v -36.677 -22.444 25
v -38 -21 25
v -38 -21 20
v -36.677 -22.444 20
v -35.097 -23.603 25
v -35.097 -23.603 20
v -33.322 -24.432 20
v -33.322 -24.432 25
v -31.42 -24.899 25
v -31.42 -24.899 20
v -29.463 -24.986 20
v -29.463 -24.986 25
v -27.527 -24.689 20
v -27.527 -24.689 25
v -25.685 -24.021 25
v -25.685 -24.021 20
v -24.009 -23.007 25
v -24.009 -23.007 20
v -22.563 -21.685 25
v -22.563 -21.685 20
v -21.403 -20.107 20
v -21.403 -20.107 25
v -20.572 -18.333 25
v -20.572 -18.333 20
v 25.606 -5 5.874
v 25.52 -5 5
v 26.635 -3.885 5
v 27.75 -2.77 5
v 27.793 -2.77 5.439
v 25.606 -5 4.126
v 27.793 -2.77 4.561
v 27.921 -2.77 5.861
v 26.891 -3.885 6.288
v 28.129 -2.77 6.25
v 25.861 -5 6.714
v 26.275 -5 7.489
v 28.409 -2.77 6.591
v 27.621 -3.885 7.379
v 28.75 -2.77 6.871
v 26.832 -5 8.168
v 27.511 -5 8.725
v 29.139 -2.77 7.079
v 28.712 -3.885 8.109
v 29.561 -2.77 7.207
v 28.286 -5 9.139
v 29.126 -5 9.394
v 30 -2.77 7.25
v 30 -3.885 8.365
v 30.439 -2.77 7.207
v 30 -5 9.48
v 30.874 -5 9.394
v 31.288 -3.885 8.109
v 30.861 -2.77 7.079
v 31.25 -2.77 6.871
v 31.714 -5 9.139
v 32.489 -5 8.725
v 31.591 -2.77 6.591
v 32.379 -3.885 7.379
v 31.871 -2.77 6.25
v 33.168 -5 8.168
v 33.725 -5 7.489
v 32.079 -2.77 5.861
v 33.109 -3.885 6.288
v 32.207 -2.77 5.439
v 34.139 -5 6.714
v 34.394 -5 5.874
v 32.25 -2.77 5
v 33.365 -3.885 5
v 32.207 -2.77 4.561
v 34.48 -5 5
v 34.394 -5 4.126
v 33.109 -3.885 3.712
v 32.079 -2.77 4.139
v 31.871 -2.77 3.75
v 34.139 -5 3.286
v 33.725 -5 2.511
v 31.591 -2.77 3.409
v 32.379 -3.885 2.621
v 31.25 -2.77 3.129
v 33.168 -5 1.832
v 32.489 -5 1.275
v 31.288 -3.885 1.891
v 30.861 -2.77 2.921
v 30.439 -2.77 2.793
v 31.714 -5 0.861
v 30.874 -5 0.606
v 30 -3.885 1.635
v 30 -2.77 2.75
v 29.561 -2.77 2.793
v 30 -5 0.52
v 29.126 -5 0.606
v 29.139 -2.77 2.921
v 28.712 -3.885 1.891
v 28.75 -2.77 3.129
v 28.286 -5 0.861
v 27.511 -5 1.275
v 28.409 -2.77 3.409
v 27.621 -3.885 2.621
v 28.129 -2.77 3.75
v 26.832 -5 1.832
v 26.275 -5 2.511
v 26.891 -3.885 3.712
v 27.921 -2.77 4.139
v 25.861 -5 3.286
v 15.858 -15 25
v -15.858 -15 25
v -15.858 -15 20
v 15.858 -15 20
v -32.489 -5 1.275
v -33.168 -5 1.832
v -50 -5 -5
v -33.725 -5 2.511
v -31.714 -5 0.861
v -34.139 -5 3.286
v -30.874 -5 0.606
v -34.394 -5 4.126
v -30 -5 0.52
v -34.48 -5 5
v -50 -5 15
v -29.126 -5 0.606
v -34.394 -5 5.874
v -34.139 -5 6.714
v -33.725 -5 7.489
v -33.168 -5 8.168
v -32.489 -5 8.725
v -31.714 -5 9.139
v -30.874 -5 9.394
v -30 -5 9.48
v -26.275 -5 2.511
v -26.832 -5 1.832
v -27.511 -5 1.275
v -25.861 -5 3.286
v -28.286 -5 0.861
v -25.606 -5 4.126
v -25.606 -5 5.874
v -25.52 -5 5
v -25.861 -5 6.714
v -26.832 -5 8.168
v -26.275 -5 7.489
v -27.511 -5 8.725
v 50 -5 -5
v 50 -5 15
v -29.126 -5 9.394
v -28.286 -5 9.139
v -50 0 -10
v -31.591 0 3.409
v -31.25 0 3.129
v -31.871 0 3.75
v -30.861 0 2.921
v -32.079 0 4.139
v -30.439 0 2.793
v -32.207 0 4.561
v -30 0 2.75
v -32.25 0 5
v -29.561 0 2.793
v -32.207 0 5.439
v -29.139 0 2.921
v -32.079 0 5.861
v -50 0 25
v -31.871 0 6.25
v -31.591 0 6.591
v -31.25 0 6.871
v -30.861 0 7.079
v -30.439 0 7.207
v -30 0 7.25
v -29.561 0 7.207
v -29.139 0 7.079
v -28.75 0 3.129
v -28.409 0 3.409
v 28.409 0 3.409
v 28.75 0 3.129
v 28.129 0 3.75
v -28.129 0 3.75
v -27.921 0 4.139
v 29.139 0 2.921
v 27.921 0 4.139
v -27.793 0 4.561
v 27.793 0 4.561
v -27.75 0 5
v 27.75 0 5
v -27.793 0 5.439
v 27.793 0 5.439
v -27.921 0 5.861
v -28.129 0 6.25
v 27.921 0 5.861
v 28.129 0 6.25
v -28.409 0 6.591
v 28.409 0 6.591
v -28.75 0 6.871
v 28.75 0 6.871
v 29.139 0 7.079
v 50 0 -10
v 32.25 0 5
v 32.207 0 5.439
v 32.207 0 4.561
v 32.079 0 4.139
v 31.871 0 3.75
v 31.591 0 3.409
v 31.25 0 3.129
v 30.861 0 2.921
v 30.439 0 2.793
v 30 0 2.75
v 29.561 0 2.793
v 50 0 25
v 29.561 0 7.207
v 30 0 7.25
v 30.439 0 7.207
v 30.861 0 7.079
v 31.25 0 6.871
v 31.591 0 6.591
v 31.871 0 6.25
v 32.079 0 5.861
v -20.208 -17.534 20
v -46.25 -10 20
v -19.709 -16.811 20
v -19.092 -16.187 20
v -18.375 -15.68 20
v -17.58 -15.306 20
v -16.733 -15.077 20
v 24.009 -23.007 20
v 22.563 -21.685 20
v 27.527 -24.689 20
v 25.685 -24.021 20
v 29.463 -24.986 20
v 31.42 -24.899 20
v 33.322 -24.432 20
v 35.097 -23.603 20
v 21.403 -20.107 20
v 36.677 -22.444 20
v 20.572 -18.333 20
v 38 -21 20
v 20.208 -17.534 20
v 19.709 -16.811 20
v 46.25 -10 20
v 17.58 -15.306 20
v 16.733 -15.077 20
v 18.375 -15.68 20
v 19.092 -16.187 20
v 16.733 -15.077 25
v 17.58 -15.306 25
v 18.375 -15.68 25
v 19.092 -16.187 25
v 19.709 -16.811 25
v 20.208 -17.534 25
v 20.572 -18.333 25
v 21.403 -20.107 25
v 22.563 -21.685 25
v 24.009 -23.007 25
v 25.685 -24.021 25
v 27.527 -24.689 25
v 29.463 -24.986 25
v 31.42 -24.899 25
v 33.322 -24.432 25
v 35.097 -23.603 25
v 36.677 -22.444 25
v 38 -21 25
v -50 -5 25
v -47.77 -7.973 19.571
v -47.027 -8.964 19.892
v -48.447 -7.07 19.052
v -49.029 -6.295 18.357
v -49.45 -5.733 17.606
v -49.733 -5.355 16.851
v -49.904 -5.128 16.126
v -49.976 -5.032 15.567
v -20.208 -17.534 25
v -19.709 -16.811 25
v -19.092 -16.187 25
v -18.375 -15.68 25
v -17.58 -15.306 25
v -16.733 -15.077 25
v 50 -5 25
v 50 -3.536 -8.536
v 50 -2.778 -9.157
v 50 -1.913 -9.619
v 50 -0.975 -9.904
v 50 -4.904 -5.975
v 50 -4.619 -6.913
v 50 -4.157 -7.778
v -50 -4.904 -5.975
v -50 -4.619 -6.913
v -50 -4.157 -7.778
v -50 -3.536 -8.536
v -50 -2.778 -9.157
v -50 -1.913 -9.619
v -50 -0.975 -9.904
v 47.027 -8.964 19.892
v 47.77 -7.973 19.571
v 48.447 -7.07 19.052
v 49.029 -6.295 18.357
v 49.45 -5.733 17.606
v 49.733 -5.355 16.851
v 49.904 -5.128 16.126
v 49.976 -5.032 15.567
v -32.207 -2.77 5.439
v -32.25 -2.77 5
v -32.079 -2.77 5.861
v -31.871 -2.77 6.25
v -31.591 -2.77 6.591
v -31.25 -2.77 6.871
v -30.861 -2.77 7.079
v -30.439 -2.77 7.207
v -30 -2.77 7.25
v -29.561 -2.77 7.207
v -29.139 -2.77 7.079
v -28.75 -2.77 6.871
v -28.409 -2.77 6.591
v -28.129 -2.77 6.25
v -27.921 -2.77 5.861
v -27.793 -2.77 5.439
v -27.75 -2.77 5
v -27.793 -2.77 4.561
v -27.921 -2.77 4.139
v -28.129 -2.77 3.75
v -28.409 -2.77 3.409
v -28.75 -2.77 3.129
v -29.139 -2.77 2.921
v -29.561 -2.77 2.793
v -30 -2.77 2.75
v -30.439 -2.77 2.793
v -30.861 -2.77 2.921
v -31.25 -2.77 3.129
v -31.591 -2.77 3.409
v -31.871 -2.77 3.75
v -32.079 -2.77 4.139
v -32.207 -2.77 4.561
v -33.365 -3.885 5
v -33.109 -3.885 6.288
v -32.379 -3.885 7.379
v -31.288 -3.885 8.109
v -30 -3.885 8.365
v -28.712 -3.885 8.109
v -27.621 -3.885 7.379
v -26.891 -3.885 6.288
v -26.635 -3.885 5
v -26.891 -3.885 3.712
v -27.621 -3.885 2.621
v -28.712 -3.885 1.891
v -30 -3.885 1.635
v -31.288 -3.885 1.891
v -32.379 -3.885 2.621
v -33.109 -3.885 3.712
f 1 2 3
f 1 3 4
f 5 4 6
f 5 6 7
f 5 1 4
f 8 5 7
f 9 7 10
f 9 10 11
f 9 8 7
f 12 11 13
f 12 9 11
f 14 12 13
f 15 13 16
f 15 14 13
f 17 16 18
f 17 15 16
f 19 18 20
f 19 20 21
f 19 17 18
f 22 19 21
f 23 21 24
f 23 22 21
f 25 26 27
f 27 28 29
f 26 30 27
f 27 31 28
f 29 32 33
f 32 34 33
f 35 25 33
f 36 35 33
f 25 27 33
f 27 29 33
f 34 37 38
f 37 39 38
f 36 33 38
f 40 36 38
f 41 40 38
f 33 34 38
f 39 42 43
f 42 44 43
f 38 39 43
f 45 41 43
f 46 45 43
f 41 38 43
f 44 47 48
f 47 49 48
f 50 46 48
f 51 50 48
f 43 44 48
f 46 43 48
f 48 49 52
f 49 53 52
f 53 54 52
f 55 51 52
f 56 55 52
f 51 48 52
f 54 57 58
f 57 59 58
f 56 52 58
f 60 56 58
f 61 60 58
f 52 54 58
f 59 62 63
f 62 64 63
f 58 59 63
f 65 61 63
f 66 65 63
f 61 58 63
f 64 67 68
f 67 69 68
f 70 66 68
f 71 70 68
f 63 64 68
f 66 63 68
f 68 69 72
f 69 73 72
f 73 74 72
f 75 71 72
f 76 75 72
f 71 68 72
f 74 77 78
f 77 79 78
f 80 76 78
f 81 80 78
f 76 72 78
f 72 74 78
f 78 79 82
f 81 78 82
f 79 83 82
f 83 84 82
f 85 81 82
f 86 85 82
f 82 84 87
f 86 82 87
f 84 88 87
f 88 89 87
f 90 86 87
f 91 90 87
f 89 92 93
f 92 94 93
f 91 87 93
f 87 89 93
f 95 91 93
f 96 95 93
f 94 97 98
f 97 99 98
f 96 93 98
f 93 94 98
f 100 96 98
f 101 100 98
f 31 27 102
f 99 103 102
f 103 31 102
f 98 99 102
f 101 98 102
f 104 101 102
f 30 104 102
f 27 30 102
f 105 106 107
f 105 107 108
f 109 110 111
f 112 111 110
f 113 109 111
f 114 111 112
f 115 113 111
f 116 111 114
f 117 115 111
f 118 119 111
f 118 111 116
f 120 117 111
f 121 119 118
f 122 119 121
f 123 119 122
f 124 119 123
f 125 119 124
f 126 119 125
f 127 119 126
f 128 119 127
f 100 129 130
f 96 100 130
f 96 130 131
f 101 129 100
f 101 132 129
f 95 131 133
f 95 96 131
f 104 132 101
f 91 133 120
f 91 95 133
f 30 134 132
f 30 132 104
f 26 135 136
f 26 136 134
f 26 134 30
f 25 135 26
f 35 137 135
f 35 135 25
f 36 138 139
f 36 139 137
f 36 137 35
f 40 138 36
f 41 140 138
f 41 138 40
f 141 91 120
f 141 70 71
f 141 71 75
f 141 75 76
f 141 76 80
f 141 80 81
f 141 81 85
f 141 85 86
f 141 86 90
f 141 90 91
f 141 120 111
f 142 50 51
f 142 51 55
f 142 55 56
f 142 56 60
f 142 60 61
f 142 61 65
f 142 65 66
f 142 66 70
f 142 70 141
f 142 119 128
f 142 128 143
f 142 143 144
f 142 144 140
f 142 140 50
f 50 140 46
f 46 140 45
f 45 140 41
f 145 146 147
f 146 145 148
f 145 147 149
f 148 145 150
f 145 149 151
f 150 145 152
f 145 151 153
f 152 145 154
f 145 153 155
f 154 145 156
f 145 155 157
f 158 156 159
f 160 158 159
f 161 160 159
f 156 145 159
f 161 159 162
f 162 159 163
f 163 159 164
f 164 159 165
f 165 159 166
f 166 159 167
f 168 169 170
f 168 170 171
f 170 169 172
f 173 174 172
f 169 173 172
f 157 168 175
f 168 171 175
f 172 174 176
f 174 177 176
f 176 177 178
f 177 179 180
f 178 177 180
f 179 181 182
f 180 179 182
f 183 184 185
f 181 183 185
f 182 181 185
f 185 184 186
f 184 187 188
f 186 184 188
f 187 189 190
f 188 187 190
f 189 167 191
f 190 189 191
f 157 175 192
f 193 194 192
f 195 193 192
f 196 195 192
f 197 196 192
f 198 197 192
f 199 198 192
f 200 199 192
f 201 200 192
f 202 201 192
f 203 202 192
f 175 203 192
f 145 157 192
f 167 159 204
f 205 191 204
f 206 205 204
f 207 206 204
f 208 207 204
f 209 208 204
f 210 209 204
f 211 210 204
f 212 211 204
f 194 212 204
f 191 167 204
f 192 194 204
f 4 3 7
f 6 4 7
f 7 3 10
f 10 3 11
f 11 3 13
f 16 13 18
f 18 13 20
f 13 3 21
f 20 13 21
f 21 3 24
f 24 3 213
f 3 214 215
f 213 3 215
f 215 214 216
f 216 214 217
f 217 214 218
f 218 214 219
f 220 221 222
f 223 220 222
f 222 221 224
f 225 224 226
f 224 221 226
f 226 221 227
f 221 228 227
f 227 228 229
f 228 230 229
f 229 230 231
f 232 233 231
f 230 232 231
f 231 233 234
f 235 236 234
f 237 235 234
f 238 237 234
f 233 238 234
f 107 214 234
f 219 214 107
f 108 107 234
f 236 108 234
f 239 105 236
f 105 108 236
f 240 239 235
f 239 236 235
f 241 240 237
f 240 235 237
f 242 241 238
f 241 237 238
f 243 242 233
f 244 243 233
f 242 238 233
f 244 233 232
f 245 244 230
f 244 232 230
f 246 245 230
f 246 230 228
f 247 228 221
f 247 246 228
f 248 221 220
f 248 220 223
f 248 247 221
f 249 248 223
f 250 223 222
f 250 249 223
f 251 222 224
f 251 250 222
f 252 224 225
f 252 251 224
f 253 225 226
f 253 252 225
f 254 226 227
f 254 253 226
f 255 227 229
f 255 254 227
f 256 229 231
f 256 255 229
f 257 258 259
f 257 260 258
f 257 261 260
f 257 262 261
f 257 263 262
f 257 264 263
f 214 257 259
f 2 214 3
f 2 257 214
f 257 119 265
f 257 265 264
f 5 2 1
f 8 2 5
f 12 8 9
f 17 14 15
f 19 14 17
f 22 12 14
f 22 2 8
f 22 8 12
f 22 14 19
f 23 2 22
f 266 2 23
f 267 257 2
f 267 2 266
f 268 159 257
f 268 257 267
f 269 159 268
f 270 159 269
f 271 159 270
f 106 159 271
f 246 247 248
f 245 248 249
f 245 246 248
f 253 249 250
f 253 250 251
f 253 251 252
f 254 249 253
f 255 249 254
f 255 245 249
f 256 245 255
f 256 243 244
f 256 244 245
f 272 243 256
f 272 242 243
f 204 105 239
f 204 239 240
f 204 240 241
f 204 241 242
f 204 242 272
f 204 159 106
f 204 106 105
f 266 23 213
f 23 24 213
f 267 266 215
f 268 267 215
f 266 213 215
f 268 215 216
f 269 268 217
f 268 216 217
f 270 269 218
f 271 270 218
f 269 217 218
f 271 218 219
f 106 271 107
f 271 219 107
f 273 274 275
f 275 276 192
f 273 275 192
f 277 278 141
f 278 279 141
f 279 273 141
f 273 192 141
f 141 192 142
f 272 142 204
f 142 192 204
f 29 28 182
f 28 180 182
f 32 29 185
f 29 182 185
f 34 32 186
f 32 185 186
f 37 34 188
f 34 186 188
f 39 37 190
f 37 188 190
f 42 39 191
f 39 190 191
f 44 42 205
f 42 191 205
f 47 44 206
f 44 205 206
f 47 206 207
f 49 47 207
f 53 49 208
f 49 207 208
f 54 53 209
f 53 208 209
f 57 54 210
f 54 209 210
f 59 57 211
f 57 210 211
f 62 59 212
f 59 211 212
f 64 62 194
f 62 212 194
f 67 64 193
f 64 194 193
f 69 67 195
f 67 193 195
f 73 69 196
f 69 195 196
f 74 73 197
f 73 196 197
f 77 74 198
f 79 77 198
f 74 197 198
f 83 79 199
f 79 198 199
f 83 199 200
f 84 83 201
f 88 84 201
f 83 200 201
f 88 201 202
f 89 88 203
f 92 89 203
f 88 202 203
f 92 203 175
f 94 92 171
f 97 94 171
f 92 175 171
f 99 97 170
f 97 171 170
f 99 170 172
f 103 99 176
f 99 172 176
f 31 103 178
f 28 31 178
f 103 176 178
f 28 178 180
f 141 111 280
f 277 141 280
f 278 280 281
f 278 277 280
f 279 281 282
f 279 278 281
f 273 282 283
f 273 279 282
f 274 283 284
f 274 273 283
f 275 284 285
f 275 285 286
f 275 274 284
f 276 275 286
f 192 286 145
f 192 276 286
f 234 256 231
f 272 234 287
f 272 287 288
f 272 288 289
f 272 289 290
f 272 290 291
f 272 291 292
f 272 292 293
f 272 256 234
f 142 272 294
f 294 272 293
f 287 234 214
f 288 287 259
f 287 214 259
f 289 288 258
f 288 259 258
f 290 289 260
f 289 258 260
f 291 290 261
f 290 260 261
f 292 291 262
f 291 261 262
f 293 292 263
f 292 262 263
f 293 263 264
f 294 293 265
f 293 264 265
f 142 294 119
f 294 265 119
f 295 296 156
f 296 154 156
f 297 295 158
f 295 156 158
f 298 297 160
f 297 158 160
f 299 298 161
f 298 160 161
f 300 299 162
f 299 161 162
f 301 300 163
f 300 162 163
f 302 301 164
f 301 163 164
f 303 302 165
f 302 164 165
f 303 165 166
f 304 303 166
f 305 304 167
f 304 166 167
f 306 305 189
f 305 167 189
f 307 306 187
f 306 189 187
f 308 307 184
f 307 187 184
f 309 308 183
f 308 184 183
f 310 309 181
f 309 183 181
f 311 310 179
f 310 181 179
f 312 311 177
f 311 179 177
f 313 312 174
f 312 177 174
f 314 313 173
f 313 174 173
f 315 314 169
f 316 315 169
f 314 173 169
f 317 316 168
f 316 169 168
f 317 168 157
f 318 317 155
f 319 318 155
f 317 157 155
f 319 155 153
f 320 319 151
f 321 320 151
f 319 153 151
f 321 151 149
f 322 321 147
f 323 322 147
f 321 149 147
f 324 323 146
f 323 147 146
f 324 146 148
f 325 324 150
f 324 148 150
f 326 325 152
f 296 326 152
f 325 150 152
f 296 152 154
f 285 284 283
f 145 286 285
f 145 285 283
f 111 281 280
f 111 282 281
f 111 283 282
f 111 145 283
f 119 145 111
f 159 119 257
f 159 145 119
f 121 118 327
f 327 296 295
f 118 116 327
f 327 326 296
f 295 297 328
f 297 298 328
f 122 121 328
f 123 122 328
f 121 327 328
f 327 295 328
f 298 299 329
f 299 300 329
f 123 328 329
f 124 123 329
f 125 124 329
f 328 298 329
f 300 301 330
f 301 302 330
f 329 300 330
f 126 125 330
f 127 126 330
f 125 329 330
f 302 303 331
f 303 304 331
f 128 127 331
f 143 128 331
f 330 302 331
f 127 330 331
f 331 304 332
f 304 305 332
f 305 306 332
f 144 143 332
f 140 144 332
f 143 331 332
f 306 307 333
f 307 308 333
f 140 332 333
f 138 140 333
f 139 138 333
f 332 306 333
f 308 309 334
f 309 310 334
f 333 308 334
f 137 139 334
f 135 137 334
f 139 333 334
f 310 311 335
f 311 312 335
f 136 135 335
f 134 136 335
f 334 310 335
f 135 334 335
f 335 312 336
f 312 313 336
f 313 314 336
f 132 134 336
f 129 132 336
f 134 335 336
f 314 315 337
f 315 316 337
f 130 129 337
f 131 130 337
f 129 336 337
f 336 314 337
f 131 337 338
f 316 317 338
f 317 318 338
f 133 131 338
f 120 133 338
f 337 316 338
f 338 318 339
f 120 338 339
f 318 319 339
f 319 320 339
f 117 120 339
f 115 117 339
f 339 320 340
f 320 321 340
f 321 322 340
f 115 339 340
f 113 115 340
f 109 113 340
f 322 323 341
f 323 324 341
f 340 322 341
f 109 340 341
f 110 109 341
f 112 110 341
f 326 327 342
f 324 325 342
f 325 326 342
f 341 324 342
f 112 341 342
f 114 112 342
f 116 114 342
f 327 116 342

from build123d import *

# Parameters (mm, degrees)
F0_W           = 100
F0_H           = 35
F1_DEPTH       = 5
F3_DEPTH       = 5
F4_R           = 5
F5_R           = 4.99999
F7_D           = 4.5
F7_CSINK_D     = 8.96
F7_CSINK_ANGLE = 90


# Not quite as in the source:
# - a fillet or chamfer is up to 0.001 mm smaller than in the source, because OpenCascade refuses the exact size


with BuildPart() as f1:
    # F0 (on Front) → F1 (new body)
    with BuildSketch(Plane.XZ):
        with Locations((0, 7.5)):
            Rectangle(F0_W, F0_H)
    extrude(amount=F1_DEPTH)

    # F2 (on face) → F3 (join)
    with BuildSketch(Plane.XY.offset(25)):
        with BuildLine():
            Line((-50, -5), (-38, -21))
            ThreePointArc((-38, -21), (-26.8377223398, -24.4868329805), (-20, -15))
            Line((-20, -15), (20, -15))
            ThreePointArc((20, -15), (26.8377223398, -24.4868329805), (38, -21))
            Line((38, -21), (50, -5))
            Line((50, -5), (-50, -5))
        make_face()
    extrude(amount=-F3_DEPTH)

    # F4
    f4_edges = [f1.edges().sort_by_distance(p)[0] for p in [
        (-20, -15, 22.5),
        (0, -5, 20),
        (20, -15, 22.5),
    ]]
    fillet(f4_edges, radius=F4_R)

    # F5 (radius 5 in the source; OpenCascade refuses exactly that, so slightly less here)
    f5_edges = [f1.edges().sort_by_distance(p)[0] for p in [
        (0, -5, -10),
    ]]
    fillet(f5_edges, radius=F5_R)

    # F7 (through all)
    with Locations(Plane.XZ.offset(5)):
        with Locations((-30, 5), (30, 5)):
            CounterSinkHole(F7_D / 2, F7_CSINK_D / 2, counter_sink_angle=F7_CSINK_ANGLE)


solid = f1.part
